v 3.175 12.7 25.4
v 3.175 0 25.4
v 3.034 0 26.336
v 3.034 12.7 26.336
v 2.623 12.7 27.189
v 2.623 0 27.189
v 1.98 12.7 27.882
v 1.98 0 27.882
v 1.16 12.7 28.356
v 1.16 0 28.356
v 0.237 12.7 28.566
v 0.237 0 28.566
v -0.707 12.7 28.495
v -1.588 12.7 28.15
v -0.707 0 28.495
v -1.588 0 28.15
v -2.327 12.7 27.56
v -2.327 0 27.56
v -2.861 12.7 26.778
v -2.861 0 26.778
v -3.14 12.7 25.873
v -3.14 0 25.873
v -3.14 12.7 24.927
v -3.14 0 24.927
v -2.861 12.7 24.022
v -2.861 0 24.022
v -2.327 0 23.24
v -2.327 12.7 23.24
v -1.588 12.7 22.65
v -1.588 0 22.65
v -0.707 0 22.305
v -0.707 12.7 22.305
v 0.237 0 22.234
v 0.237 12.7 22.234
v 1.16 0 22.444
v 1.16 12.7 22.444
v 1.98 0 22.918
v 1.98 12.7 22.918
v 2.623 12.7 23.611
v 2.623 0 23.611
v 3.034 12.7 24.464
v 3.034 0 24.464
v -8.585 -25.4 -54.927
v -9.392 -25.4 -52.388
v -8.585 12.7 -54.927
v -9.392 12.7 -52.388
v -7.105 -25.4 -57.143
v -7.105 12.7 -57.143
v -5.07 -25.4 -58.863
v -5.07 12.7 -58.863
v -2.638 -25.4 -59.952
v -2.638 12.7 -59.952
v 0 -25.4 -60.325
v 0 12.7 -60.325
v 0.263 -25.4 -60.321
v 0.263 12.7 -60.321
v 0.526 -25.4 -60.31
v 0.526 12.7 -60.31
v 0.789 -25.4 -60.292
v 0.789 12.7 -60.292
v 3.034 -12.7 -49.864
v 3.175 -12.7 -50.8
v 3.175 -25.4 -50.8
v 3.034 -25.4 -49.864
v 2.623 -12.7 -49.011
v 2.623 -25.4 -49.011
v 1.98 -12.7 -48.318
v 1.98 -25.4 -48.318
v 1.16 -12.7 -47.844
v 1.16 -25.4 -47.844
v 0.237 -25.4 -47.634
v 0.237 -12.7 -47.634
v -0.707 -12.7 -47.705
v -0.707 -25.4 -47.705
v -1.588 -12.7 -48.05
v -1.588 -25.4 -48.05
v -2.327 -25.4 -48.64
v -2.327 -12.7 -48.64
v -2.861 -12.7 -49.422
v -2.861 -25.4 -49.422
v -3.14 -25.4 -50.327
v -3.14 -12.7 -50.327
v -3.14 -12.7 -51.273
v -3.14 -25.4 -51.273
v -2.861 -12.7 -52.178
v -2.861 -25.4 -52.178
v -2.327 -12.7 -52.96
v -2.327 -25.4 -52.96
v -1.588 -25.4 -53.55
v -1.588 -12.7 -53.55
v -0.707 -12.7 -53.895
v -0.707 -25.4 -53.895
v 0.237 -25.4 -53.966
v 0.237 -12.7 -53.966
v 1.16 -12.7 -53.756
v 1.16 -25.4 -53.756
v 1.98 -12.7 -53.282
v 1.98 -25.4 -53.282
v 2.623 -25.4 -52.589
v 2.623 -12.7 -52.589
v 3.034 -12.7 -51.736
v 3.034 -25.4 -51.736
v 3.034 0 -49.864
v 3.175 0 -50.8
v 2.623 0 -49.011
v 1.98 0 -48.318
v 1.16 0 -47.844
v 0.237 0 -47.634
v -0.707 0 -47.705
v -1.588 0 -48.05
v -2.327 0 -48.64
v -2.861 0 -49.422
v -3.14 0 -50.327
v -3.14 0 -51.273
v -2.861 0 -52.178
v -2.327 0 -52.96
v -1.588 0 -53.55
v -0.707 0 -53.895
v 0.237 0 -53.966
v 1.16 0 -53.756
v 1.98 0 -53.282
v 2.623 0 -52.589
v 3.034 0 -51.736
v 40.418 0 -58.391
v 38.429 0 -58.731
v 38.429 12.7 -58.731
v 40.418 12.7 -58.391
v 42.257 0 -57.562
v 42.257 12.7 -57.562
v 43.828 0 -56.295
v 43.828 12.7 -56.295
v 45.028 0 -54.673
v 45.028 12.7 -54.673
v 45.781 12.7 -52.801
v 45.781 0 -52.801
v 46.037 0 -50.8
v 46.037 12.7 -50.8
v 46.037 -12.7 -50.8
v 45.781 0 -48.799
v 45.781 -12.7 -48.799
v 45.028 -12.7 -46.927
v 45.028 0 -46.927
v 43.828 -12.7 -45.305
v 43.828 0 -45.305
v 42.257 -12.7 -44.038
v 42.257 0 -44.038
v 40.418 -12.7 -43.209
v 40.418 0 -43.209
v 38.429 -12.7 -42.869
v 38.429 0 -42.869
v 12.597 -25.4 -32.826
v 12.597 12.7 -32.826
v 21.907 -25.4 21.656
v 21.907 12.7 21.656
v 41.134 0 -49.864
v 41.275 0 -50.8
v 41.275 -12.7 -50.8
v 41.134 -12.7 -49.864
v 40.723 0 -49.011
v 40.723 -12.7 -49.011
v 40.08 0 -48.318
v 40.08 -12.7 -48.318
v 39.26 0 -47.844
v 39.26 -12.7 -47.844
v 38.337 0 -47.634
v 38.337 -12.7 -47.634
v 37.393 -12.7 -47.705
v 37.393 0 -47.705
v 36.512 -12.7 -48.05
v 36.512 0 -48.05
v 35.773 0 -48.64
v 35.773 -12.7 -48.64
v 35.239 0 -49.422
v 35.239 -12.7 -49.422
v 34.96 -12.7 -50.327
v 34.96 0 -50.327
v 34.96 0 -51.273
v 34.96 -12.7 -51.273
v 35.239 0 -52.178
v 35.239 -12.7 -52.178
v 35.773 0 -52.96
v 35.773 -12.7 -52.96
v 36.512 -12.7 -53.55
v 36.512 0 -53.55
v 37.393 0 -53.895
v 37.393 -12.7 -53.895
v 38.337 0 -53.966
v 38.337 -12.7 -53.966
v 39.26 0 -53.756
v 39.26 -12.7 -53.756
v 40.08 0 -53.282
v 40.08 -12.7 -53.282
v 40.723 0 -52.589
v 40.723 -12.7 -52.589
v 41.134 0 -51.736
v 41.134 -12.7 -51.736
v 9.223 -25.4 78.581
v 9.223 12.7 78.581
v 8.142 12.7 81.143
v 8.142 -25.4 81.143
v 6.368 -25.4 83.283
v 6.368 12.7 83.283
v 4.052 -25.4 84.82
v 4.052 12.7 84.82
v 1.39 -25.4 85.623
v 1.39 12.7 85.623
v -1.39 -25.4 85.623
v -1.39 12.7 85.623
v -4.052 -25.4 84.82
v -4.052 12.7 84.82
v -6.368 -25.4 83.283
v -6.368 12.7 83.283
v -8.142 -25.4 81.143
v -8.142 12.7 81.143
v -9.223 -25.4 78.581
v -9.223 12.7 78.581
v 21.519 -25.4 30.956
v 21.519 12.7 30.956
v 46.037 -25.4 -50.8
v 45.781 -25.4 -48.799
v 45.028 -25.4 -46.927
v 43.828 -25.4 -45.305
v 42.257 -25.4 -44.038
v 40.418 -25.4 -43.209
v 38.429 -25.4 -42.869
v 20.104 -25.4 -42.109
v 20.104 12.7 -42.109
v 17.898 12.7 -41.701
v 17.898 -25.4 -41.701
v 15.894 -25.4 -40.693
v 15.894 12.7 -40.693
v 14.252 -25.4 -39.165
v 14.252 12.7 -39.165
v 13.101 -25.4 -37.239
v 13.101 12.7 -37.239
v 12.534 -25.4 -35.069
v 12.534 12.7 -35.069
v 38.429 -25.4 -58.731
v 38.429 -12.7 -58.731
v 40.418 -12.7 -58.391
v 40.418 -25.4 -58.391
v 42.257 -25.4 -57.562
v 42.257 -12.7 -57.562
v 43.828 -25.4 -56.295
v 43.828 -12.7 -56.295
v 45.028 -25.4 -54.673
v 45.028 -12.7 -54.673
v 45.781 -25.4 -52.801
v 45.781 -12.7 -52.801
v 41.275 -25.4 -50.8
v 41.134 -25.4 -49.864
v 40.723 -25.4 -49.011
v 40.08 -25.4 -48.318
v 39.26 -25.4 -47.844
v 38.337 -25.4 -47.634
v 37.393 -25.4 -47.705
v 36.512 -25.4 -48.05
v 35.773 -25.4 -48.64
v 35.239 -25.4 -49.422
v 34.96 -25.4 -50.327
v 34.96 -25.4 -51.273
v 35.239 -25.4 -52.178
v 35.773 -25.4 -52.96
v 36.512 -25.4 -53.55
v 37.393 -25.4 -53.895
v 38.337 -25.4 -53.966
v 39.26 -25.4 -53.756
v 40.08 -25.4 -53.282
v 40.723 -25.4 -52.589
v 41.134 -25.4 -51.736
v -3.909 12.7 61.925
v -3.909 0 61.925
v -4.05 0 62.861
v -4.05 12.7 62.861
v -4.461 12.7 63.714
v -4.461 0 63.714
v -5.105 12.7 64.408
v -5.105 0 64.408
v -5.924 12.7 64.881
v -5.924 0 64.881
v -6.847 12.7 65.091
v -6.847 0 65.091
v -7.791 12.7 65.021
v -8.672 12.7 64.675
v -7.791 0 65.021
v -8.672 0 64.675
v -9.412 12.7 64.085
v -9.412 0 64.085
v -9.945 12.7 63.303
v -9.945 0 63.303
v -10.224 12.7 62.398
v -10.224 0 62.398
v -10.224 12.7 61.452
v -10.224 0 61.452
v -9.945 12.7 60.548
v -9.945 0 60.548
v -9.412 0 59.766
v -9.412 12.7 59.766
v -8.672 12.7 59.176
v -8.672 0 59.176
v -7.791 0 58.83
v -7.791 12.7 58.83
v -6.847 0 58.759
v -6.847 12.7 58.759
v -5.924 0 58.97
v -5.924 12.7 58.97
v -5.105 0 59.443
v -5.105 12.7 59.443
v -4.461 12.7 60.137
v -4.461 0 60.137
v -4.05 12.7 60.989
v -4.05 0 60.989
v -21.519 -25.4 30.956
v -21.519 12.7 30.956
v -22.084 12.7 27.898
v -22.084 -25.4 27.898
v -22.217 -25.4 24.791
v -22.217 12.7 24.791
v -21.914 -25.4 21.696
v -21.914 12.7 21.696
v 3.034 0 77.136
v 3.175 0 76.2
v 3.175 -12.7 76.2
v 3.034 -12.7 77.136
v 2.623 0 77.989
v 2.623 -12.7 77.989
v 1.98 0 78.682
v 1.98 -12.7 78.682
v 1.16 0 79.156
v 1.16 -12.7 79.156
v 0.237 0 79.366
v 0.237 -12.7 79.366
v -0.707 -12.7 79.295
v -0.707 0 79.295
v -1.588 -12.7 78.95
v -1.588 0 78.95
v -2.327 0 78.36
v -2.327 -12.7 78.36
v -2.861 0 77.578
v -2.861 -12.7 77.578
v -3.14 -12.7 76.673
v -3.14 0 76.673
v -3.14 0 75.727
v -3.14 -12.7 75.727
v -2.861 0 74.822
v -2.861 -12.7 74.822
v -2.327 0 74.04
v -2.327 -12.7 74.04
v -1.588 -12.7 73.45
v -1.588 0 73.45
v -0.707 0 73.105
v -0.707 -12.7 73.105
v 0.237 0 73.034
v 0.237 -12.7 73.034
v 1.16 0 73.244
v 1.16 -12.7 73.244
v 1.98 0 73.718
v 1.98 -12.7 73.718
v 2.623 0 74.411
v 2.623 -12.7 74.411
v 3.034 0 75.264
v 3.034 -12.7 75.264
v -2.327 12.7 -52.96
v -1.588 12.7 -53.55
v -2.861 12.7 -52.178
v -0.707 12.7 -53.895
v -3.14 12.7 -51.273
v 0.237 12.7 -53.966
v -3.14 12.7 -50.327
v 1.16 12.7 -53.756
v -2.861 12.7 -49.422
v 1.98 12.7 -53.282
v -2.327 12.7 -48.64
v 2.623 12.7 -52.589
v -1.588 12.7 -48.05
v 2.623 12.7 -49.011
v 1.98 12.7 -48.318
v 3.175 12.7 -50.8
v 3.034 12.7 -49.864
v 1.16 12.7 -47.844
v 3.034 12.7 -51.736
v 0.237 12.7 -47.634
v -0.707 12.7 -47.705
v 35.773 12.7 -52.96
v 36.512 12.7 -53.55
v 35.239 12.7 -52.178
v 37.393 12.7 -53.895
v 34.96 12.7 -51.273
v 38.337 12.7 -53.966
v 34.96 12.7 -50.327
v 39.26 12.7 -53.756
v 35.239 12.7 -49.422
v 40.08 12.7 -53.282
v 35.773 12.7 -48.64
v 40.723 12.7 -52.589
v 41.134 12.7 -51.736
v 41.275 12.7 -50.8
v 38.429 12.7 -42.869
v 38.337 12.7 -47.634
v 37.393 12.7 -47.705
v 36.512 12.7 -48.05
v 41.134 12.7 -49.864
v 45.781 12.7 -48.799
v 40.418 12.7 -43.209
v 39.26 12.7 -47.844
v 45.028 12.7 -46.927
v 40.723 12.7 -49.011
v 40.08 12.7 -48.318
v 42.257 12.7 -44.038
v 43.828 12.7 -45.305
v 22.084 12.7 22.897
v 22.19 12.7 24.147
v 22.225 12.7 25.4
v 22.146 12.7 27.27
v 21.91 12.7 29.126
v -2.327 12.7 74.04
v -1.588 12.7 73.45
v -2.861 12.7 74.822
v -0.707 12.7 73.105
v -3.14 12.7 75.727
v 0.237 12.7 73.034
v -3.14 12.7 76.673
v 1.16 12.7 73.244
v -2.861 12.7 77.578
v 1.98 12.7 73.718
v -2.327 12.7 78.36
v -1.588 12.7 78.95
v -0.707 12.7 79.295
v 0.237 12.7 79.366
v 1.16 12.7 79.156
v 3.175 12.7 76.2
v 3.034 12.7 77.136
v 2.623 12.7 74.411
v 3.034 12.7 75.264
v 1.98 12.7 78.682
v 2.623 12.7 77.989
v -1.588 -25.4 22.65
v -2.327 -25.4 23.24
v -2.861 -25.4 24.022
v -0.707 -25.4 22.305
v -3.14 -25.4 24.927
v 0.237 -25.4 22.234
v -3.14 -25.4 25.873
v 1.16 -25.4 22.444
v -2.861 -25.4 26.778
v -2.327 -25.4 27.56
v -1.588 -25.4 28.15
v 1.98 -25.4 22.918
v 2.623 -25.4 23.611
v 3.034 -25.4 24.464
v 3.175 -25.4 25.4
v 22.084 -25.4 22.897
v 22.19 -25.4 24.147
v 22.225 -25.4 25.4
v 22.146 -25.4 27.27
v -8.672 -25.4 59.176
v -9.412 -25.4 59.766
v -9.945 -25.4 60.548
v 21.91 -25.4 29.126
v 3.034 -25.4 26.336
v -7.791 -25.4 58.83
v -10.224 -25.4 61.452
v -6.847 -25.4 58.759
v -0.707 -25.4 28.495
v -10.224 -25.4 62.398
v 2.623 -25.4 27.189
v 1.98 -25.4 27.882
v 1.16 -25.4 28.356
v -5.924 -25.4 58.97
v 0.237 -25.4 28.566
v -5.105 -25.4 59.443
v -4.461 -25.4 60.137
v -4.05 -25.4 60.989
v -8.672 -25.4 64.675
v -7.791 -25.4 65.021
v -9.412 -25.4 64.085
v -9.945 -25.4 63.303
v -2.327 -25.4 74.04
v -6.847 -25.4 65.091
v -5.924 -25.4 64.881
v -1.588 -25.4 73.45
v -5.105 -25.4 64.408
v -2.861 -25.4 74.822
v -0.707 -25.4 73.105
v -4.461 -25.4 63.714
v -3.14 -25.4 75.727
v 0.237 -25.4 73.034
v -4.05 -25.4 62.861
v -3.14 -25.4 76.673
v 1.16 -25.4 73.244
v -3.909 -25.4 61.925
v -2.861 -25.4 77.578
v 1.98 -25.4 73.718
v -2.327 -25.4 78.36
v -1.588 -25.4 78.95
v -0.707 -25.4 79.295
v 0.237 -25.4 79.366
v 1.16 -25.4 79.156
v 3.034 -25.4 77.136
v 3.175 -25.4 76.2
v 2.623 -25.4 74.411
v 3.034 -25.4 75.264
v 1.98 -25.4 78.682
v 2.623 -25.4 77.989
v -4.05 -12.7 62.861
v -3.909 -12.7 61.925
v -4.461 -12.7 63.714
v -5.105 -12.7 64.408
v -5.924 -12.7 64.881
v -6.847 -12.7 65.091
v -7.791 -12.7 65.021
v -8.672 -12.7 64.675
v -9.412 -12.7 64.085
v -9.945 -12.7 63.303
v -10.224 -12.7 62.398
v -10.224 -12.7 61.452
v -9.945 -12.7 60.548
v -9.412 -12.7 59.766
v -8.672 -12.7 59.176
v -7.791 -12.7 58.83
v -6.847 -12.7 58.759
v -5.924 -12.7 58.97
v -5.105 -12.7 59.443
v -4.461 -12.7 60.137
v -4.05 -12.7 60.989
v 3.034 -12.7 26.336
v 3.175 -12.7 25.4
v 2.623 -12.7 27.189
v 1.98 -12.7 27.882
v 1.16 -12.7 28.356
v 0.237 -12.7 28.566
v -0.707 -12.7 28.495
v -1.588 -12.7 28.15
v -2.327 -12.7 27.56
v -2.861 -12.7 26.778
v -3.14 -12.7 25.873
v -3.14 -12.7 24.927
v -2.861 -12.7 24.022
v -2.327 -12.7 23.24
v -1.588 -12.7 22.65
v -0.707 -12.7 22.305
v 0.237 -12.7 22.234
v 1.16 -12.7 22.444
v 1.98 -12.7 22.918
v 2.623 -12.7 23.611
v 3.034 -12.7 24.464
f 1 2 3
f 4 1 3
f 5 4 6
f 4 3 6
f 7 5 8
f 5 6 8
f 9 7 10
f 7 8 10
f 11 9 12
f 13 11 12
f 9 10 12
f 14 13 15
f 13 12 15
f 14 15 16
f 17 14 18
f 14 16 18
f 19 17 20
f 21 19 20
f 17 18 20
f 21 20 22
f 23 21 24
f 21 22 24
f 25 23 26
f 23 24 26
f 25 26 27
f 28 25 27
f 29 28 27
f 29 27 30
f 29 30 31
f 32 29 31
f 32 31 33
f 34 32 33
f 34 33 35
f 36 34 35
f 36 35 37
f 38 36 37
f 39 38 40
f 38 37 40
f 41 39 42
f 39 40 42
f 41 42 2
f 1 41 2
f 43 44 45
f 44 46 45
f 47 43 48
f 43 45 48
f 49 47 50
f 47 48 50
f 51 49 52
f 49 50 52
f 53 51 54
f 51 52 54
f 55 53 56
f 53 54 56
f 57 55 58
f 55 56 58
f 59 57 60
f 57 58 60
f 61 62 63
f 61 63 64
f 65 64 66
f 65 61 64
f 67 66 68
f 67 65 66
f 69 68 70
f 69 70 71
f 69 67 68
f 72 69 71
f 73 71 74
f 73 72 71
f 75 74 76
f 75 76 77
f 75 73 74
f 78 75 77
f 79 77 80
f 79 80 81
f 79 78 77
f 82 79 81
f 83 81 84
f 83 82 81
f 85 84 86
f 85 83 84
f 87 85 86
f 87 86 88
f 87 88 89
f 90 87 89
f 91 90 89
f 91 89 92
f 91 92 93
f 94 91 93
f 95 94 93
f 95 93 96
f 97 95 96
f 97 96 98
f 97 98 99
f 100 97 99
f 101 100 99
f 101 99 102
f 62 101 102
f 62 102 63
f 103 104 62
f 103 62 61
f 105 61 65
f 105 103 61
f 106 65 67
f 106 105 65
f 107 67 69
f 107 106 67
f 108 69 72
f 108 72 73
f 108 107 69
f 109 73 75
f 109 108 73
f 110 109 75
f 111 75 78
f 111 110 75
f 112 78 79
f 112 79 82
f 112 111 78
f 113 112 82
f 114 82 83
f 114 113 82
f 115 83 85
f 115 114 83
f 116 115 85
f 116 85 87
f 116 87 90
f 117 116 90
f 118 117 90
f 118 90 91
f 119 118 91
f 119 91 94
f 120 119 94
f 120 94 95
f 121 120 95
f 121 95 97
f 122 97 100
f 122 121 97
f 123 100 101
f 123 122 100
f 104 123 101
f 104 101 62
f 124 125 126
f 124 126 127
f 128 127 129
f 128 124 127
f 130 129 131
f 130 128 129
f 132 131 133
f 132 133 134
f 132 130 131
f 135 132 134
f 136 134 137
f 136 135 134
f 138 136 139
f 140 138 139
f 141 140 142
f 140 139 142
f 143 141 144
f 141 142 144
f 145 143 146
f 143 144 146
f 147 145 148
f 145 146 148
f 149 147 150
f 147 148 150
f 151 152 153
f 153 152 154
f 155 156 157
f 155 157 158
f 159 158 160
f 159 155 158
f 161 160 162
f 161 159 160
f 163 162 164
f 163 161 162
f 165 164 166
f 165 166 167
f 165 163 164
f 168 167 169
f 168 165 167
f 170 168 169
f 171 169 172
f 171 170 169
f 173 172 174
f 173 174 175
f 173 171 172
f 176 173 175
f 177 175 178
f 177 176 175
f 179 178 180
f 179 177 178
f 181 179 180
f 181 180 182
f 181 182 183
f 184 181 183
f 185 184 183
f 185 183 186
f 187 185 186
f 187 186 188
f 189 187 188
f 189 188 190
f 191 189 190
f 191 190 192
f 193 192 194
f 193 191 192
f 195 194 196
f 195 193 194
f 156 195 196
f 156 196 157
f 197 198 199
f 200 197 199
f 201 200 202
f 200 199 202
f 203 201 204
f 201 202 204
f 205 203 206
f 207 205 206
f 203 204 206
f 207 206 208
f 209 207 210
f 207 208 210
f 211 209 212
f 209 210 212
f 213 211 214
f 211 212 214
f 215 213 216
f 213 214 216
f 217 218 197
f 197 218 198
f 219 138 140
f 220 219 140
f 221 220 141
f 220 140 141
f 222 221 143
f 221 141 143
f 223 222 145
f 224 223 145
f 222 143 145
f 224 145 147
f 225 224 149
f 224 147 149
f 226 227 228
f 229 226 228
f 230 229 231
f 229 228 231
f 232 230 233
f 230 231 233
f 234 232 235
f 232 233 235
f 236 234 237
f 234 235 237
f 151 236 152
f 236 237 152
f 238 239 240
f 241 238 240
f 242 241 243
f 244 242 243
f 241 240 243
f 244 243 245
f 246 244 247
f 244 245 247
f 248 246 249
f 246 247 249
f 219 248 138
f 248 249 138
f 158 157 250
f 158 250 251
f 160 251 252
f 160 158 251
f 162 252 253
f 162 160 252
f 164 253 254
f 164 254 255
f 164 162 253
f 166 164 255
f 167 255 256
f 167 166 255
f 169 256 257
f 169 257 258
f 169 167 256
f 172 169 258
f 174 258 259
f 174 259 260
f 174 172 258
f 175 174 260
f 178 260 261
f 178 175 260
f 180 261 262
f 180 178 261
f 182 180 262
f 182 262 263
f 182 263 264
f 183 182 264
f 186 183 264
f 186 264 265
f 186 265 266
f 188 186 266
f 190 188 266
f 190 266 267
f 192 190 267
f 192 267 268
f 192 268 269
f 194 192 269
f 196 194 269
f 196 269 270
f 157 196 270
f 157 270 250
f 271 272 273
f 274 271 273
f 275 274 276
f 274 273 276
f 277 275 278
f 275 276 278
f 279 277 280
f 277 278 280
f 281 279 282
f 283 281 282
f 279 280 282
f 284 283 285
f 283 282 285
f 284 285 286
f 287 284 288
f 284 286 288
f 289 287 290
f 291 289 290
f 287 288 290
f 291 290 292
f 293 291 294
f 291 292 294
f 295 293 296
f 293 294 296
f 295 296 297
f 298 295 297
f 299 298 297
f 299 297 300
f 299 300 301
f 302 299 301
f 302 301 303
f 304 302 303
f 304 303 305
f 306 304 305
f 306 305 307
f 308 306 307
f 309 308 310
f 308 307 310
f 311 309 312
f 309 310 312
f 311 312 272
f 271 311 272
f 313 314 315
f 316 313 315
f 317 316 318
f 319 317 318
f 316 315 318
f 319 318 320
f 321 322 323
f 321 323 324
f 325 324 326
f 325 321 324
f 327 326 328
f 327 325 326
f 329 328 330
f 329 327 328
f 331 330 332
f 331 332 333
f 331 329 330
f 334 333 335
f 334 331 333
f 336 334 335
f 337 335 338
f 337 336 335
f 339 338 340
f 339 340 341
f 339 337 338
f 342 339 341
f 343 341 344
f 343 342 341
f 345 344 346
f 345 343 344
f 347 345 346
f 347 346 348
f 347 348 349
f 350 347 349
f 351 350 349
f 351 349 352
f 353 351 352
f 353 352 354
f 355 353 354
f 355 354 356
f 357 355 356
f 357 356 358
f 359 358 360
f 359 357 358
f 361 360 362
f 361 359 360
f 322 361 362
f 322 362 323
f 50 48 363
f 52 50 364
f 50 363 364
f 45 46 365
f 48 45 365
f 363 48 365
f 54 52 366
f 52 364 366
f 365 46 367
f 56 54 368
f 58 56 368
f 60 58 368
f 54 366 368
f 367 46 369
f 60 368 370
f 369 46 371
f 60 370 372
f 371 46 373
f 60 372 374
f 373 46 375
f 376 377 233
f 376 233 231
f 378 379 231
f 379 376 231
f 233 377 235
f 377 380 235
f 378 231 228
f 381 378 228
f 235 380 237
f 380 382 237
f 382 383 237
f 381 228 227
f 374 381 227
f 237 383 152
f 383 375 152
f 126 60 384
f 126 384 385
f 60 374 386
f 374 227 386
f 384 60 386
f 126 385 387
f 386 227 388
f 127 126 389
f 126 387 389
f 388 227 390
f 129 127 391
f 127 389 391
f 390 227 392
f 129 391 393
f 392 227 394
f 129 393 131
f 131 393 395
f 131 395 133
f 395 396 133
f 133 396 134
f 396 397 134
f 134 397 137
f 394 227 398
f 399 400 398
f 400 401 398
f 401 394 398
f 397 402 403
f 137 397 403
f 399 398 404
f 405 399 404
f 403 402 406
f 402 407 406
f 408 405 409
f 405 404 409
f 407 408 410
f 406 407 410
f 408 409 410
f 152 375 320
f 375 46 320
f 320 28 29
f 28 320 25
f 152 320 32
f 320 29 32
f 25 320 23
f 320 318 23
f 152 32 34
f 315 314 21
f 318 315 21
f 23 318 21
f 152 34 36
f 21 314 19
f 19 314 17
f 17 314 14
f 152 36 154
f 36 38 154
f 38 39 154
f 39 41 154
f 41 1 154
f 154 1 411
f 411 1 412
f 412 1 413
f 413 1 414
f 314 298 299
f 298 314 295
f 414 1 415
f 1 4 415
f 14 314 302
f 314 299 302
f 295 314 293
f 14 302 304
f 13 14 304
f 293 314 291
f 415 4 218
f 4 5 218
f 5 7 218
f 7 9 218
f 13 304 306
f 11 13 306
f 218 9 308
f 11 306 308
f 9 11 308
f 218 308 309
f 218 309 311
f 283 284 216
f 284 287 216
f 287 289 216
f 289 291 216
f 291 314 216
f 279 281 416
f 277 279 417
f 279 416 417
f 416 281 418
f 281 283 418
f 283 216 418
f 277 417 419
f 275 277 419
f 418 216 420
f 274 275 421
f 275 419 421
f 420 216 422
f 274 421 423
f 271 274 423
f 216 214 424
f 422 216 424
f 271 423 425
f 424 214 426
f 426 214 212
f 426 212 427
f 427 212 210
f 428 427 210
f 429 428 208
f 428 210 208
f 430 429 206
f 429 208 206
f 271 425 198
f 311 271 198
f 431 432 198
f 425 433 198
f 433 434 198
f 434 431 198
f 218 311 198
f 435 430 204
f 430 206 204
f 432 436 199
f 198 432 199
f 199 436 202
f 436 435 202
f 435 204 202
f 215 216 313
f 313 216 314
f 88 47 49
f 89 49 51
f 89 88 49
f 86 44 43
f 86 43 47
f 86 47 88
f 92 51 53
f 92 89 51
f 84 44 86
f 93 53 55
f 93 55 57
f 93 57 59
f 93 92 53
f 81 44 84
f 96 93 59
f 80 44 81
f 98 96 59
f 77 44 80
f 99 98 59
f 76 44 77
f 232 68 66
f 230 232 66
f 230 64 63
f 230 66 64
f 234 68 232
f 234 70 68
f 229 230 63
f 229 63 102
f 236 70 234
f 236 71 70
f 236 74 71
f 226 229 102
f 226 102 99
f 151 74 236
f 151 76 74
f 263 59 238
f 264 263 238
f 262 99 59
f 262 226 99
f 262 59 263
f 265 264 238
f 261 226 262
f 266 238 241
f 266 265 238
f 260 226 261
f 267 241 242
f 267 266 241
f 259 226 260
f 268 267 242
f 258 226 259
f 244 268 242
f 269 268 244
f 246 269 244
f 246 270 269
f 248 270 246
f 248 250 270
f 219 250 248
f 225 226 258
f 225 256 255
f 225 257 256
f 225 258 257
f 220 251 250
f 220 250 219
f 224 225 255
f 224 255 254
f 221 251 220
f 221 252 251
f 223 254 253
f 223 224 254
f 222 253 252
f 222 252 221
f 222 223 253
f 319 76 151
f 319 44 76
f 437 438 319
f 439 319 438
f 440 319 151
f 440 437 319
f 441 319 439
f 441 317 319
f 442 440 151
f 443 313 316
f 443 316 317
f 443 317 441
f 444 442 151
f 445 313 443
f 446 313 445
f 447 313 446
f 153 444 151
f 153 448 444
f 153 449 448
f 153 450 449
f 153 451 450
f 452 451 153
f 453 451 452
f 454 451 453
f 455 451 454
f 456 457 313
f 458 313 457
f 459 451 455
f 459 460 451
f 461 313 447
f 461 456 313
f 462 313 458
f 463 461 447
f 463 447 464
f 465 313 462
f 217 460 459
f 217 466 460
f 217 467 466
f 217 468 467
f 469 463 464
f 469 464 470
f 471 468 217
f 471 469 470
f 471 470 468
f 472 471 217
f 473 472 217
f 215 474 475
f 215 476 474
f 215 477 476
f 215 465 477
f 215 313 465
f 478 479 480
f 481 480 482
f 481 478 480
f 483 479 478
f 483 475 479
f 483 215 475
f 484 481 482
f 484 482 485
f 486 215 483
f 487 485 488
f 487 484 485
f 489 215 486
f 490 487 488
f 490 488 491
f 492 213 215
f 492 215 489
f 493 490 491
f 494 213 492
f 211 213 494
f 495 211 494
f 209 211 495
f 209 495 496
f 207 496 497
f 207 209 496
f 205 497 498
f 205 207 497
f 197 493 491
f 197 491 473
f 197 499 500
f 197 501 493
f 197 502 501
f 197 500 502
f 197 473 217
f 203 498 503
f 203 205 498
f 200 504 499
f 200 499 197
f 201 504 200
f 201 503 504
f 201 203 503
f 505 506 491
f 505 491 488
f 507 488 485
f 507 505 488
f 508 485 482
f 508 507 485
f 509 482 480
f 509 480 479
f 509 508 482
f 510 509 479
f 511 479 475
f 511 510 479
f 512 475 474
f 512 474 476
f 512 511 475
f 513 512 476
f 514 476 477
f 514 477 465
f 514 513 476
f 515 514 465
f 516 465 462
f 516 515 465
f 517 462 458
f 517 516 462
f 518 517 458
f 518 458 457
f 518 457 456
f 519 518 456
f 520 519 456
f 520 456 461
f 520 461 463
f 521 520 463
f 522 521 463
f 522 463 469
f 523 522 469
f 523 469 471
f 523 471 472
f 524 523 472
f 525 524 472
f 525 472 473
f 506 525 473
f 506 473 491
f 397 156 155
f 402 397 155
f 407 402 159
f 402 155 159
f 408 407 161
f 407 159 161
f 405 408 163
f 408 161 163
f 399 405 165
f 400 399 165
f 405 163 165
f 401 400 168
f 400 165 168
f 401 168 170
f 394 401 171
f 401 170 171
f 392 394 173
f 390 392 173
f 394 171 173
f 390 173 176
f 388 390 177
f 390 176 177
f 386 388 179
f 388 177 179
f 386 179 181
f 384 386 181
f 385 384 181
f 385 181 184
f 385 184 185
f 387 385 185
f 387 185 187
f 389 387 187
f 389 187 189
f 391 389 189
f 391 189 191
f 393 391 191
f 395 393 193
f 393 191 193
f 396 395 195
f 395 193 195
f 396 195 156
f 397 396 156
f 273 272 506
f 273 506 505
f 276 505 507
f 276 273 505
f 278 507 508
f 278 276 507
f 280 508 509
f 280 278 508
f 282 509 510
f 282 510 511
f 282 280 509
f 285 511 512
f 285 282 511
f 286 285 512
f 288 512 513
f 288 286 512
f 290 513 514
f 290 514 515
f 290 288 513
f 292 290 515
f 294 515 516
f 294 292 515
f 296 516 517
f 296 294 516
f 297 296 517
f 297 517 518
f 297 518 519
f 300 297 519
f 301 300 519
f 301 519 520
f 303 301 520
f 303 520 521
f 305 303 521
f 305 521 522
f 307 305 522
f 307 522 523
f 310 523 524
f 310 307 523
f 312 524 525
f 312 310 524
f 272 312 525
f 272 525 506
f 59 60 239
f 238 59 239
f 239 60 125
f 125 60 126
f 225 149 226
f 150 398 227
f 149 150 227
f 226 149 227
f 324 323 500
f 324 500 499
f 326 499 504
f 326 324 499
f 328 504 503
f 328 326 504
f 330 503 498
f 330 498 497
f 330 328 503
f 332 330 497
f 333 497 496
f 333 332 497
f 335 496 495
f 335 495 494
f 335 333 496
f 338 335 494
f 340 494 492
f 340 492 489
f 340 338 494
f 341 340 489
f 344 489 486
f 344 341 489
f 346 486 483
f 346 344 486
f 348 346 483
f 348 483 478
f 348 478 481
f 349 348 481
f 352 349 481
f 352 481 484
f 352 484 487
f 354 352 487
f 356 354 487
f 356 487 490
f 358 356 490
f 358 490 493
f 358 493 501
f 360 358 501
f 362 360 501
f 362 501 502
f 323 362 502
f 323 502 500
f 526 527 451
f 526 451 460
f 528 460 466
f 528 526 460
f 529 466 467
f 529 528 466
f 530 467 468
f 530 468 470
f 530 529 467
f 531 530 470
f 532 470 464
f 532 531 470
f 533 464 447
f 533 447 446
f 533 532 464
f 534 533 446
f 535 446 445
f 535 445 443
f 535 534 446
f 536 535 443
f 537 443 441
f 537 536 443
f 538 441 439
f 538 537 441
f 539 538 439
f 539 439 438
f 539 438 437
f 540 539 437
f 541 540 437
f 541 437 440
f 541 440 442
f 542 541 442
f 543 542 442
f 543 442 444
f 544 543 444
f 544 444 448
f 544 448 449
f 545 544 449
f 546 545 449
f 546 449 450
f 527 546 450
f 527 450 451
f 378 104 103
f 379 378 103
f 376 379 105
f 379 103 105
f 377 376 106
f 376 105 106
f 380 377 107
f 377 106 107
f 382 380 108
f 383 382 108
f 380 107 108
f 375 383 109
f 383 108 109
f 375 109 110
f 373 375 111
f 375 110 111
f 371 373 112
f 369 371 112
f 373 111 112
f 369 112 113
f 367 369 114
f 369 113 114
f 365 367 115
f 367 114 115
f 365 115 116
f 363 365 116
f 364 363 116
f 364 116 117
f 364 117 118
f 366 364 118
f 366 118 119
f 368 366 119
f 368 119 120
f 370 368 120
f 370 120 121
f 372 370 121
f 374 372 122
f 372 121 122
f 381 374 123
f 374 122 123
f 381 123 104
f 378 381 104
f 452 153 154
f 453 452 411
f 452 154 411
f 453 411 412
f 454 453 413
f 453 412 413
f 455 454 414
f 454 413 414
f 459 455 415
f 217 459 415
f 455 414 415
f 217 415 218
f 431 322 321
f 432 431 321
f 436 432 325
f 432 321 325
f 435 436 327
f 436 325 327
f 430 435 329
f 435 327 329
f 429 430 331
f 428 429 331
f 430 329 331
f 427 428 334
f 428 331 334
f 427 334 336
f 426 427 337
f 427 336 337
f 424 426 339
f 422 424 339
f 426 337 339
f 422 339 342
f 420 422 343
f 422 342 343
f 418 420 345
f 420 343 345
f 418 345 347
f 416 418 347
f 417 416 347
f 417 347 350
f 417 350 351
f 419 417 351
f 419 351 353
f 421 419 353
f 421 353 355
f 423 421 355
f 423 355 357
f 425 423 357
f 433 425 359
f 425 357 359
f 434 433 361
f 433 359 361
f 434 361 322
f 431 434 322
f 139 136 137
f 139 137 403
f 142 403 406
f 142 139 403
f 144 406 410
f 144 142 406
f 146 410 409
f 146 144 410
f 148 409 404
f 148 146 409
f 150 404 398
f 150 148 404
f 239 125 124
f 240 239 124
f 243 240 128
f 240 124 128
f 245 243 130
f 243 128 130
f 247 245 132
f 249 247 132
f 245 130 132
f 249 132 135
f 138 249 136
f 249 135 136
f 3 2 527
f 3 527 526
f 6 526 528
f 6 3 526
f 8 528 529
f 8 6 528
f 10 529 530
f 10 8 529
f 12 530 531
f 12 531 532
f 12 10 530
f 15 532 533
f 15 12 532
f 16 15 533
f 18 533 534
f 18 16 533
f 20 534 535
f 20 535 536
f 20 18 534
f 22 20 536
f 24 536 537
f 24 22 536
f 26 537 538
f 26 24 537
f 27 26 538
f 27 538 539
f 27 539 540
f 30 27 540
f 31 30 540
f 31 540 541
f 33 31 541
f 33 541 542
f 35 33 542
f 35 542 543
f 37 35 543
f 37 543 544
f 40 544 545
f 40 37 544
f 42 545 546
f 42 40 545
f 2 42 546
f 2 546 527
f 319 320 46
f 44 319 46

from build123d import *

# Parameters (mm, degrees)
F0_R     = 3.175
F1_DEPTH = 12.7
F2_DEPTH = 25.4


with BuildPart() as f1:
    # F0 (on Front) → F1 (new body, symmetric)
    with BuildSketch(Plane.XZ):
        with BuildLine():
            ThreePointArc((-9.2225415932, 78.58125), (-1.2001908859, 66.7509171431), (9.525, 76.2))
            ThreePointArc((9.525, 76.2), (9.4490828569, 77.4001908859), (9.2225415932, 78.58125))
            ThreePointArc((9.2225415932, 78.58125), (0, 85.725), (-9.2225415932, 78.58125))
        make_face()
        with Locations((0, 76.2)):
            Circle(F0_R, mode=Mode.SUBTRACT)
        with BuildLine():
            ThreePointArc((9.2225415932, 78.58125), (9.4490828569, 77.4001908859), (9.525, 76.2))
            ThreePointArc((9.525, 76.2), (-1.2001908859, 66.7509171431), (-9.2225415932, 78.58125))
            Line((-9.2225415932, 78.58125), (-21.5192637174, 30.95625))
            ThreePointArc((-21.5192637174, 30.95625), (0, 47.625), (21.5192637174, 30.95625))
            Line((21.5192637174, 30.95625), (9.2225415932, 78.58125))
        make_face()
        with Locations((-7.0844171569, 61.9252)):
            Circle(F0_R, mode=Mode.SUBTRACT)
        with BuildLine():
            ThreePointArc((22.225, 25.4), (22.0478599995, 28.2004454004), (21.5192637174, 30.95625))
            ThreePointArc((21.5192637174, 30.95625), (0, 47.625), (-21.5192637174, 30.95625))
            ThreePointArc((-21.5192637174, 30.95625), (-22.204821299, 26.3468558918), (-21.9141455299, 21.6958333333))
            ThreePointArc((-21.9141455299, 21.6958333333), (-0.0201347951, 3.1750091206), (21.9073979622, 21.6561330786))
            ThreePointArc((21.9073979622, 21.6561330786), (22.1454571494, 23.5213428613), (22.225, 25.4))
        make_face()
        with Locations((0, 25.4)):
            Circle(F0_R, mode=Mode.SUBTRACT)
        with BuildLine():
            ThreePointArc((21.9073979622, 21.6561330786), (-0.0201347951, 3.1750091206), (-21.9141455299, 21.6958333333))
            Line((-21.9141455299, 21.6958333333), (-9.3917766557, -52.3875))
            ThreePointArc((-9.3917766557, -52.3875), (-0.7965401292, -41.3083642704), (9.525, -50.8))
            ThreePointArc((9.525, -50.8), (7.0085890152, -57.2502174394), (0.7889779495, -60.2922673158))
            Line((0.7889779495, -60.2922673158), (38.4290236064, -58.730677759))
            ThreePointArc((38.4290236064, -58.730677759), (30.1625, -50.8), (38.4290236064, -42.869322241))
            Line((38.4290236064, -42.869322241), (20.1036312885, -42.1090484218))
            ThreePointArc((20.1036312885, -42.1090484218), (14.2515043463, -39.1649364905), (12.5965921187, -32.8264468968))
            Line((12.5965921187, -32.8264468968), (21.9073979622, 21.6561330786))
        make_face()
        with BuildLine():
            ThreePointArc((9.525, -50.8), (-0.7965401292, -41.3083642704), (-9.3917766557, -52.3875))
            ThreePointArc((-9.3917766557, -52.3875), (-6.1483610621, -58.0748389157), (0, -60.325))
            Line((0, -60.325), (0.7889779495, -60.2922673158))
            ThreePointArc((0.7889779495, -60.2922673158), (7.0085890152, -57.2502174394), (9.525, -50.8))
        make_face()
        with Locations((0, -50.8)):
            Circle(F0_R, mode=Mode.SUBTRACT)
        with BuildLine():
            Line((0.7889779495, -60.2922673158), (0, -60.325))
            ThreePointArc((0, -60.325), (0.3948283277, -60.3168133107), (0.7889779495, -60.2922673158))
        make_face()
        with BuildLine():
            ThreePointArc((46.0375, -50.8), (43.8278063482, -45.3048984826), (38.4290236064, -42.869322241))
            ThreePointArc((38.4290236064, -42.869322241), (30.1625, -50.8), (38.4290236064, -58.730677759))
            ThreePointArc((38.4290236064, -58.730677759), (43.8278063482, -56.2951015174), (46.0375, -50.8))
        make_face()
        with Locations((38.1, -50.8)):
            Circle(F0_R, mode=Mode.SUBTRACT)
    extrude(amount=F1_DEPTH, both=True)

    # F0 (on Front) → F2 (join)
    with BuildSketch(Plane.XZ):
        with BuildLine():
            ThreePointArc((-9.2225415932, 78.58125), (-1.2001908859, 66.7509171431), (9.525, 76.2))
            ThreePointArc((9.525, 76.2), (9.4490828569, 77.4001908859), (9.2225415932, 78.58125))
            ThreePointArc((9.2225415932, 78.58125), (0, 85.725), (-9.2225415932, 78.58125))
        make_face()
        with Locations((0, 76.2)):
            Circle(F0_R, mode=Mode.SUBTRACT)
        with BuildLine():
            ThreePointArc((9.2225415932, 78.58125), (9.4490828569, 77.4001908859), (9.525, 76.2))
            ThreePointArc((9.525, 76.2), (-1.2001908859, 66.7509171431), (-9.2225415932, 78.58125))
            Line((-9.2225415932, 78.58125), (-21.5192637174, 30.95625))
            ThreePointArc((-21.5192637174, 30.95625), (0, 47.625), (21.5192637174, 30.95625))
            Line((21.5192637174, 30.95625), (9.2225415932, 78.58125))
        make_face()
        with Locations((-7.0844171569, 61.9252)):
            Circle(F0_R, mode=Mode.SUBTRACT)
        with BuildLine():
            ThreePointArc((22.225, 25.4), (22.0478599995, 28.2004454004), (21.5192637174, 30.95625))
            ThreePointArc((21.5192637174, 30.95625), (0, 47.625), (-21.5192637174, 30.95625))
            ThreePointArc((-21.5192637174, 30.95625), (-22.204821299, 26.3468558918), (-21.9141455299, 21.6958333333))
            ThreePointArc((-21.9141455299, 21.6958333333), (-0.0201347951, 3.1750091206), (21.9073979622, 21.6561330786))
            ThreePointArc((21.9073979622, 21.6561330786), (22.1454571494, 23.5213428613), (22.225, 25.4))
        make_face()
        with Locations((0, 25.4)):
            Circle(F0_R, mode=Mode.SUBTRACT)
        with BuildLine():
            ThreePointArc((21.9073979622, 21.6561330786), (-0.0201347951, 3.1750091206), (-21.9141455299, 21.6958333333))
            Line((-21.9141455299, 21.6958333333), (-9.3917766557, -52.3875))
            ThreePointArc((-9.3917766557, -52.3875), (-0.7965401292, -41.3083642704), (9.525, -50.8))
            ThreePointArc((9.525, -50.8), (7.0085890152, -57.2502174394), (0.7889779495, -60.2922673158))
            Line((0.7889779495, -60.2922673158), (38.4290236064, -58.730677759))
            ThreePointArc((38.4290236064, -58.730677759), (30.1625, -50.8), (38.4290236064, -42.869322241))
            Line((38.4290236064, -42.869322241), (20.1036312885, -42.1090484218))
            ThreePointArc((20.1036312885, -42.1090484218), (14.2515043463, -39.1649364905), (12.5965921187, -32.8264468968))
            Line((12.5965921187, -32.8264468968), (21.9073979622, 21.6561330786))
        make_face()
        with BuildLine():
            ThreePointArc((9.525, -50.8), (-0.7965401292, -41.3083642704), (-9.3917766557, -52.3875))
            ThreePointArc((-9.3917766557, -52.3875), (-6.1483610621, -58.0748389157), (0, -60.325))
            Line((0, -60.325), (0.7889779495, -60.2922673158))
            ThreePointArc((0.7889779495, -60.2922673158), (7.0085890152, -57.2502174394), (9.525, -50.8))
        make_face()
        with Locations((0, -50.8)):
            Circle(F0_R, mode=Mode.SUBTRACT)
        with BuildLine():
            Line((0.7889779495, -60.2922673158), (0, -60.325))
            ThreePointArc((0, -60.325), (0.3948283277, -60.3168133107), (0.7889779495, -60.2922673158))
        make_face()
        with BuildLine():
            ThreePointArc((46.0375, -50.8), (43.8278063482, -45.3048984826), (38.4290236064, -42.869322241))
            ThreePointArc((38.4290236064, -42.869322241), (30.1625, -50.8), (38.4290236064, -58.730677759))
            ThreePointArc((38.4290236064, -58.730677759), (43.8278063482, -56.2951015174), (46.0375, -50.8))
        make_face()
        with Locations((38.1, -50.8)):
            Circle(F0_R, mode=Mode.SUBTRACT)
    extrude(amount=F2_DEPTH)


solid = f1.part
